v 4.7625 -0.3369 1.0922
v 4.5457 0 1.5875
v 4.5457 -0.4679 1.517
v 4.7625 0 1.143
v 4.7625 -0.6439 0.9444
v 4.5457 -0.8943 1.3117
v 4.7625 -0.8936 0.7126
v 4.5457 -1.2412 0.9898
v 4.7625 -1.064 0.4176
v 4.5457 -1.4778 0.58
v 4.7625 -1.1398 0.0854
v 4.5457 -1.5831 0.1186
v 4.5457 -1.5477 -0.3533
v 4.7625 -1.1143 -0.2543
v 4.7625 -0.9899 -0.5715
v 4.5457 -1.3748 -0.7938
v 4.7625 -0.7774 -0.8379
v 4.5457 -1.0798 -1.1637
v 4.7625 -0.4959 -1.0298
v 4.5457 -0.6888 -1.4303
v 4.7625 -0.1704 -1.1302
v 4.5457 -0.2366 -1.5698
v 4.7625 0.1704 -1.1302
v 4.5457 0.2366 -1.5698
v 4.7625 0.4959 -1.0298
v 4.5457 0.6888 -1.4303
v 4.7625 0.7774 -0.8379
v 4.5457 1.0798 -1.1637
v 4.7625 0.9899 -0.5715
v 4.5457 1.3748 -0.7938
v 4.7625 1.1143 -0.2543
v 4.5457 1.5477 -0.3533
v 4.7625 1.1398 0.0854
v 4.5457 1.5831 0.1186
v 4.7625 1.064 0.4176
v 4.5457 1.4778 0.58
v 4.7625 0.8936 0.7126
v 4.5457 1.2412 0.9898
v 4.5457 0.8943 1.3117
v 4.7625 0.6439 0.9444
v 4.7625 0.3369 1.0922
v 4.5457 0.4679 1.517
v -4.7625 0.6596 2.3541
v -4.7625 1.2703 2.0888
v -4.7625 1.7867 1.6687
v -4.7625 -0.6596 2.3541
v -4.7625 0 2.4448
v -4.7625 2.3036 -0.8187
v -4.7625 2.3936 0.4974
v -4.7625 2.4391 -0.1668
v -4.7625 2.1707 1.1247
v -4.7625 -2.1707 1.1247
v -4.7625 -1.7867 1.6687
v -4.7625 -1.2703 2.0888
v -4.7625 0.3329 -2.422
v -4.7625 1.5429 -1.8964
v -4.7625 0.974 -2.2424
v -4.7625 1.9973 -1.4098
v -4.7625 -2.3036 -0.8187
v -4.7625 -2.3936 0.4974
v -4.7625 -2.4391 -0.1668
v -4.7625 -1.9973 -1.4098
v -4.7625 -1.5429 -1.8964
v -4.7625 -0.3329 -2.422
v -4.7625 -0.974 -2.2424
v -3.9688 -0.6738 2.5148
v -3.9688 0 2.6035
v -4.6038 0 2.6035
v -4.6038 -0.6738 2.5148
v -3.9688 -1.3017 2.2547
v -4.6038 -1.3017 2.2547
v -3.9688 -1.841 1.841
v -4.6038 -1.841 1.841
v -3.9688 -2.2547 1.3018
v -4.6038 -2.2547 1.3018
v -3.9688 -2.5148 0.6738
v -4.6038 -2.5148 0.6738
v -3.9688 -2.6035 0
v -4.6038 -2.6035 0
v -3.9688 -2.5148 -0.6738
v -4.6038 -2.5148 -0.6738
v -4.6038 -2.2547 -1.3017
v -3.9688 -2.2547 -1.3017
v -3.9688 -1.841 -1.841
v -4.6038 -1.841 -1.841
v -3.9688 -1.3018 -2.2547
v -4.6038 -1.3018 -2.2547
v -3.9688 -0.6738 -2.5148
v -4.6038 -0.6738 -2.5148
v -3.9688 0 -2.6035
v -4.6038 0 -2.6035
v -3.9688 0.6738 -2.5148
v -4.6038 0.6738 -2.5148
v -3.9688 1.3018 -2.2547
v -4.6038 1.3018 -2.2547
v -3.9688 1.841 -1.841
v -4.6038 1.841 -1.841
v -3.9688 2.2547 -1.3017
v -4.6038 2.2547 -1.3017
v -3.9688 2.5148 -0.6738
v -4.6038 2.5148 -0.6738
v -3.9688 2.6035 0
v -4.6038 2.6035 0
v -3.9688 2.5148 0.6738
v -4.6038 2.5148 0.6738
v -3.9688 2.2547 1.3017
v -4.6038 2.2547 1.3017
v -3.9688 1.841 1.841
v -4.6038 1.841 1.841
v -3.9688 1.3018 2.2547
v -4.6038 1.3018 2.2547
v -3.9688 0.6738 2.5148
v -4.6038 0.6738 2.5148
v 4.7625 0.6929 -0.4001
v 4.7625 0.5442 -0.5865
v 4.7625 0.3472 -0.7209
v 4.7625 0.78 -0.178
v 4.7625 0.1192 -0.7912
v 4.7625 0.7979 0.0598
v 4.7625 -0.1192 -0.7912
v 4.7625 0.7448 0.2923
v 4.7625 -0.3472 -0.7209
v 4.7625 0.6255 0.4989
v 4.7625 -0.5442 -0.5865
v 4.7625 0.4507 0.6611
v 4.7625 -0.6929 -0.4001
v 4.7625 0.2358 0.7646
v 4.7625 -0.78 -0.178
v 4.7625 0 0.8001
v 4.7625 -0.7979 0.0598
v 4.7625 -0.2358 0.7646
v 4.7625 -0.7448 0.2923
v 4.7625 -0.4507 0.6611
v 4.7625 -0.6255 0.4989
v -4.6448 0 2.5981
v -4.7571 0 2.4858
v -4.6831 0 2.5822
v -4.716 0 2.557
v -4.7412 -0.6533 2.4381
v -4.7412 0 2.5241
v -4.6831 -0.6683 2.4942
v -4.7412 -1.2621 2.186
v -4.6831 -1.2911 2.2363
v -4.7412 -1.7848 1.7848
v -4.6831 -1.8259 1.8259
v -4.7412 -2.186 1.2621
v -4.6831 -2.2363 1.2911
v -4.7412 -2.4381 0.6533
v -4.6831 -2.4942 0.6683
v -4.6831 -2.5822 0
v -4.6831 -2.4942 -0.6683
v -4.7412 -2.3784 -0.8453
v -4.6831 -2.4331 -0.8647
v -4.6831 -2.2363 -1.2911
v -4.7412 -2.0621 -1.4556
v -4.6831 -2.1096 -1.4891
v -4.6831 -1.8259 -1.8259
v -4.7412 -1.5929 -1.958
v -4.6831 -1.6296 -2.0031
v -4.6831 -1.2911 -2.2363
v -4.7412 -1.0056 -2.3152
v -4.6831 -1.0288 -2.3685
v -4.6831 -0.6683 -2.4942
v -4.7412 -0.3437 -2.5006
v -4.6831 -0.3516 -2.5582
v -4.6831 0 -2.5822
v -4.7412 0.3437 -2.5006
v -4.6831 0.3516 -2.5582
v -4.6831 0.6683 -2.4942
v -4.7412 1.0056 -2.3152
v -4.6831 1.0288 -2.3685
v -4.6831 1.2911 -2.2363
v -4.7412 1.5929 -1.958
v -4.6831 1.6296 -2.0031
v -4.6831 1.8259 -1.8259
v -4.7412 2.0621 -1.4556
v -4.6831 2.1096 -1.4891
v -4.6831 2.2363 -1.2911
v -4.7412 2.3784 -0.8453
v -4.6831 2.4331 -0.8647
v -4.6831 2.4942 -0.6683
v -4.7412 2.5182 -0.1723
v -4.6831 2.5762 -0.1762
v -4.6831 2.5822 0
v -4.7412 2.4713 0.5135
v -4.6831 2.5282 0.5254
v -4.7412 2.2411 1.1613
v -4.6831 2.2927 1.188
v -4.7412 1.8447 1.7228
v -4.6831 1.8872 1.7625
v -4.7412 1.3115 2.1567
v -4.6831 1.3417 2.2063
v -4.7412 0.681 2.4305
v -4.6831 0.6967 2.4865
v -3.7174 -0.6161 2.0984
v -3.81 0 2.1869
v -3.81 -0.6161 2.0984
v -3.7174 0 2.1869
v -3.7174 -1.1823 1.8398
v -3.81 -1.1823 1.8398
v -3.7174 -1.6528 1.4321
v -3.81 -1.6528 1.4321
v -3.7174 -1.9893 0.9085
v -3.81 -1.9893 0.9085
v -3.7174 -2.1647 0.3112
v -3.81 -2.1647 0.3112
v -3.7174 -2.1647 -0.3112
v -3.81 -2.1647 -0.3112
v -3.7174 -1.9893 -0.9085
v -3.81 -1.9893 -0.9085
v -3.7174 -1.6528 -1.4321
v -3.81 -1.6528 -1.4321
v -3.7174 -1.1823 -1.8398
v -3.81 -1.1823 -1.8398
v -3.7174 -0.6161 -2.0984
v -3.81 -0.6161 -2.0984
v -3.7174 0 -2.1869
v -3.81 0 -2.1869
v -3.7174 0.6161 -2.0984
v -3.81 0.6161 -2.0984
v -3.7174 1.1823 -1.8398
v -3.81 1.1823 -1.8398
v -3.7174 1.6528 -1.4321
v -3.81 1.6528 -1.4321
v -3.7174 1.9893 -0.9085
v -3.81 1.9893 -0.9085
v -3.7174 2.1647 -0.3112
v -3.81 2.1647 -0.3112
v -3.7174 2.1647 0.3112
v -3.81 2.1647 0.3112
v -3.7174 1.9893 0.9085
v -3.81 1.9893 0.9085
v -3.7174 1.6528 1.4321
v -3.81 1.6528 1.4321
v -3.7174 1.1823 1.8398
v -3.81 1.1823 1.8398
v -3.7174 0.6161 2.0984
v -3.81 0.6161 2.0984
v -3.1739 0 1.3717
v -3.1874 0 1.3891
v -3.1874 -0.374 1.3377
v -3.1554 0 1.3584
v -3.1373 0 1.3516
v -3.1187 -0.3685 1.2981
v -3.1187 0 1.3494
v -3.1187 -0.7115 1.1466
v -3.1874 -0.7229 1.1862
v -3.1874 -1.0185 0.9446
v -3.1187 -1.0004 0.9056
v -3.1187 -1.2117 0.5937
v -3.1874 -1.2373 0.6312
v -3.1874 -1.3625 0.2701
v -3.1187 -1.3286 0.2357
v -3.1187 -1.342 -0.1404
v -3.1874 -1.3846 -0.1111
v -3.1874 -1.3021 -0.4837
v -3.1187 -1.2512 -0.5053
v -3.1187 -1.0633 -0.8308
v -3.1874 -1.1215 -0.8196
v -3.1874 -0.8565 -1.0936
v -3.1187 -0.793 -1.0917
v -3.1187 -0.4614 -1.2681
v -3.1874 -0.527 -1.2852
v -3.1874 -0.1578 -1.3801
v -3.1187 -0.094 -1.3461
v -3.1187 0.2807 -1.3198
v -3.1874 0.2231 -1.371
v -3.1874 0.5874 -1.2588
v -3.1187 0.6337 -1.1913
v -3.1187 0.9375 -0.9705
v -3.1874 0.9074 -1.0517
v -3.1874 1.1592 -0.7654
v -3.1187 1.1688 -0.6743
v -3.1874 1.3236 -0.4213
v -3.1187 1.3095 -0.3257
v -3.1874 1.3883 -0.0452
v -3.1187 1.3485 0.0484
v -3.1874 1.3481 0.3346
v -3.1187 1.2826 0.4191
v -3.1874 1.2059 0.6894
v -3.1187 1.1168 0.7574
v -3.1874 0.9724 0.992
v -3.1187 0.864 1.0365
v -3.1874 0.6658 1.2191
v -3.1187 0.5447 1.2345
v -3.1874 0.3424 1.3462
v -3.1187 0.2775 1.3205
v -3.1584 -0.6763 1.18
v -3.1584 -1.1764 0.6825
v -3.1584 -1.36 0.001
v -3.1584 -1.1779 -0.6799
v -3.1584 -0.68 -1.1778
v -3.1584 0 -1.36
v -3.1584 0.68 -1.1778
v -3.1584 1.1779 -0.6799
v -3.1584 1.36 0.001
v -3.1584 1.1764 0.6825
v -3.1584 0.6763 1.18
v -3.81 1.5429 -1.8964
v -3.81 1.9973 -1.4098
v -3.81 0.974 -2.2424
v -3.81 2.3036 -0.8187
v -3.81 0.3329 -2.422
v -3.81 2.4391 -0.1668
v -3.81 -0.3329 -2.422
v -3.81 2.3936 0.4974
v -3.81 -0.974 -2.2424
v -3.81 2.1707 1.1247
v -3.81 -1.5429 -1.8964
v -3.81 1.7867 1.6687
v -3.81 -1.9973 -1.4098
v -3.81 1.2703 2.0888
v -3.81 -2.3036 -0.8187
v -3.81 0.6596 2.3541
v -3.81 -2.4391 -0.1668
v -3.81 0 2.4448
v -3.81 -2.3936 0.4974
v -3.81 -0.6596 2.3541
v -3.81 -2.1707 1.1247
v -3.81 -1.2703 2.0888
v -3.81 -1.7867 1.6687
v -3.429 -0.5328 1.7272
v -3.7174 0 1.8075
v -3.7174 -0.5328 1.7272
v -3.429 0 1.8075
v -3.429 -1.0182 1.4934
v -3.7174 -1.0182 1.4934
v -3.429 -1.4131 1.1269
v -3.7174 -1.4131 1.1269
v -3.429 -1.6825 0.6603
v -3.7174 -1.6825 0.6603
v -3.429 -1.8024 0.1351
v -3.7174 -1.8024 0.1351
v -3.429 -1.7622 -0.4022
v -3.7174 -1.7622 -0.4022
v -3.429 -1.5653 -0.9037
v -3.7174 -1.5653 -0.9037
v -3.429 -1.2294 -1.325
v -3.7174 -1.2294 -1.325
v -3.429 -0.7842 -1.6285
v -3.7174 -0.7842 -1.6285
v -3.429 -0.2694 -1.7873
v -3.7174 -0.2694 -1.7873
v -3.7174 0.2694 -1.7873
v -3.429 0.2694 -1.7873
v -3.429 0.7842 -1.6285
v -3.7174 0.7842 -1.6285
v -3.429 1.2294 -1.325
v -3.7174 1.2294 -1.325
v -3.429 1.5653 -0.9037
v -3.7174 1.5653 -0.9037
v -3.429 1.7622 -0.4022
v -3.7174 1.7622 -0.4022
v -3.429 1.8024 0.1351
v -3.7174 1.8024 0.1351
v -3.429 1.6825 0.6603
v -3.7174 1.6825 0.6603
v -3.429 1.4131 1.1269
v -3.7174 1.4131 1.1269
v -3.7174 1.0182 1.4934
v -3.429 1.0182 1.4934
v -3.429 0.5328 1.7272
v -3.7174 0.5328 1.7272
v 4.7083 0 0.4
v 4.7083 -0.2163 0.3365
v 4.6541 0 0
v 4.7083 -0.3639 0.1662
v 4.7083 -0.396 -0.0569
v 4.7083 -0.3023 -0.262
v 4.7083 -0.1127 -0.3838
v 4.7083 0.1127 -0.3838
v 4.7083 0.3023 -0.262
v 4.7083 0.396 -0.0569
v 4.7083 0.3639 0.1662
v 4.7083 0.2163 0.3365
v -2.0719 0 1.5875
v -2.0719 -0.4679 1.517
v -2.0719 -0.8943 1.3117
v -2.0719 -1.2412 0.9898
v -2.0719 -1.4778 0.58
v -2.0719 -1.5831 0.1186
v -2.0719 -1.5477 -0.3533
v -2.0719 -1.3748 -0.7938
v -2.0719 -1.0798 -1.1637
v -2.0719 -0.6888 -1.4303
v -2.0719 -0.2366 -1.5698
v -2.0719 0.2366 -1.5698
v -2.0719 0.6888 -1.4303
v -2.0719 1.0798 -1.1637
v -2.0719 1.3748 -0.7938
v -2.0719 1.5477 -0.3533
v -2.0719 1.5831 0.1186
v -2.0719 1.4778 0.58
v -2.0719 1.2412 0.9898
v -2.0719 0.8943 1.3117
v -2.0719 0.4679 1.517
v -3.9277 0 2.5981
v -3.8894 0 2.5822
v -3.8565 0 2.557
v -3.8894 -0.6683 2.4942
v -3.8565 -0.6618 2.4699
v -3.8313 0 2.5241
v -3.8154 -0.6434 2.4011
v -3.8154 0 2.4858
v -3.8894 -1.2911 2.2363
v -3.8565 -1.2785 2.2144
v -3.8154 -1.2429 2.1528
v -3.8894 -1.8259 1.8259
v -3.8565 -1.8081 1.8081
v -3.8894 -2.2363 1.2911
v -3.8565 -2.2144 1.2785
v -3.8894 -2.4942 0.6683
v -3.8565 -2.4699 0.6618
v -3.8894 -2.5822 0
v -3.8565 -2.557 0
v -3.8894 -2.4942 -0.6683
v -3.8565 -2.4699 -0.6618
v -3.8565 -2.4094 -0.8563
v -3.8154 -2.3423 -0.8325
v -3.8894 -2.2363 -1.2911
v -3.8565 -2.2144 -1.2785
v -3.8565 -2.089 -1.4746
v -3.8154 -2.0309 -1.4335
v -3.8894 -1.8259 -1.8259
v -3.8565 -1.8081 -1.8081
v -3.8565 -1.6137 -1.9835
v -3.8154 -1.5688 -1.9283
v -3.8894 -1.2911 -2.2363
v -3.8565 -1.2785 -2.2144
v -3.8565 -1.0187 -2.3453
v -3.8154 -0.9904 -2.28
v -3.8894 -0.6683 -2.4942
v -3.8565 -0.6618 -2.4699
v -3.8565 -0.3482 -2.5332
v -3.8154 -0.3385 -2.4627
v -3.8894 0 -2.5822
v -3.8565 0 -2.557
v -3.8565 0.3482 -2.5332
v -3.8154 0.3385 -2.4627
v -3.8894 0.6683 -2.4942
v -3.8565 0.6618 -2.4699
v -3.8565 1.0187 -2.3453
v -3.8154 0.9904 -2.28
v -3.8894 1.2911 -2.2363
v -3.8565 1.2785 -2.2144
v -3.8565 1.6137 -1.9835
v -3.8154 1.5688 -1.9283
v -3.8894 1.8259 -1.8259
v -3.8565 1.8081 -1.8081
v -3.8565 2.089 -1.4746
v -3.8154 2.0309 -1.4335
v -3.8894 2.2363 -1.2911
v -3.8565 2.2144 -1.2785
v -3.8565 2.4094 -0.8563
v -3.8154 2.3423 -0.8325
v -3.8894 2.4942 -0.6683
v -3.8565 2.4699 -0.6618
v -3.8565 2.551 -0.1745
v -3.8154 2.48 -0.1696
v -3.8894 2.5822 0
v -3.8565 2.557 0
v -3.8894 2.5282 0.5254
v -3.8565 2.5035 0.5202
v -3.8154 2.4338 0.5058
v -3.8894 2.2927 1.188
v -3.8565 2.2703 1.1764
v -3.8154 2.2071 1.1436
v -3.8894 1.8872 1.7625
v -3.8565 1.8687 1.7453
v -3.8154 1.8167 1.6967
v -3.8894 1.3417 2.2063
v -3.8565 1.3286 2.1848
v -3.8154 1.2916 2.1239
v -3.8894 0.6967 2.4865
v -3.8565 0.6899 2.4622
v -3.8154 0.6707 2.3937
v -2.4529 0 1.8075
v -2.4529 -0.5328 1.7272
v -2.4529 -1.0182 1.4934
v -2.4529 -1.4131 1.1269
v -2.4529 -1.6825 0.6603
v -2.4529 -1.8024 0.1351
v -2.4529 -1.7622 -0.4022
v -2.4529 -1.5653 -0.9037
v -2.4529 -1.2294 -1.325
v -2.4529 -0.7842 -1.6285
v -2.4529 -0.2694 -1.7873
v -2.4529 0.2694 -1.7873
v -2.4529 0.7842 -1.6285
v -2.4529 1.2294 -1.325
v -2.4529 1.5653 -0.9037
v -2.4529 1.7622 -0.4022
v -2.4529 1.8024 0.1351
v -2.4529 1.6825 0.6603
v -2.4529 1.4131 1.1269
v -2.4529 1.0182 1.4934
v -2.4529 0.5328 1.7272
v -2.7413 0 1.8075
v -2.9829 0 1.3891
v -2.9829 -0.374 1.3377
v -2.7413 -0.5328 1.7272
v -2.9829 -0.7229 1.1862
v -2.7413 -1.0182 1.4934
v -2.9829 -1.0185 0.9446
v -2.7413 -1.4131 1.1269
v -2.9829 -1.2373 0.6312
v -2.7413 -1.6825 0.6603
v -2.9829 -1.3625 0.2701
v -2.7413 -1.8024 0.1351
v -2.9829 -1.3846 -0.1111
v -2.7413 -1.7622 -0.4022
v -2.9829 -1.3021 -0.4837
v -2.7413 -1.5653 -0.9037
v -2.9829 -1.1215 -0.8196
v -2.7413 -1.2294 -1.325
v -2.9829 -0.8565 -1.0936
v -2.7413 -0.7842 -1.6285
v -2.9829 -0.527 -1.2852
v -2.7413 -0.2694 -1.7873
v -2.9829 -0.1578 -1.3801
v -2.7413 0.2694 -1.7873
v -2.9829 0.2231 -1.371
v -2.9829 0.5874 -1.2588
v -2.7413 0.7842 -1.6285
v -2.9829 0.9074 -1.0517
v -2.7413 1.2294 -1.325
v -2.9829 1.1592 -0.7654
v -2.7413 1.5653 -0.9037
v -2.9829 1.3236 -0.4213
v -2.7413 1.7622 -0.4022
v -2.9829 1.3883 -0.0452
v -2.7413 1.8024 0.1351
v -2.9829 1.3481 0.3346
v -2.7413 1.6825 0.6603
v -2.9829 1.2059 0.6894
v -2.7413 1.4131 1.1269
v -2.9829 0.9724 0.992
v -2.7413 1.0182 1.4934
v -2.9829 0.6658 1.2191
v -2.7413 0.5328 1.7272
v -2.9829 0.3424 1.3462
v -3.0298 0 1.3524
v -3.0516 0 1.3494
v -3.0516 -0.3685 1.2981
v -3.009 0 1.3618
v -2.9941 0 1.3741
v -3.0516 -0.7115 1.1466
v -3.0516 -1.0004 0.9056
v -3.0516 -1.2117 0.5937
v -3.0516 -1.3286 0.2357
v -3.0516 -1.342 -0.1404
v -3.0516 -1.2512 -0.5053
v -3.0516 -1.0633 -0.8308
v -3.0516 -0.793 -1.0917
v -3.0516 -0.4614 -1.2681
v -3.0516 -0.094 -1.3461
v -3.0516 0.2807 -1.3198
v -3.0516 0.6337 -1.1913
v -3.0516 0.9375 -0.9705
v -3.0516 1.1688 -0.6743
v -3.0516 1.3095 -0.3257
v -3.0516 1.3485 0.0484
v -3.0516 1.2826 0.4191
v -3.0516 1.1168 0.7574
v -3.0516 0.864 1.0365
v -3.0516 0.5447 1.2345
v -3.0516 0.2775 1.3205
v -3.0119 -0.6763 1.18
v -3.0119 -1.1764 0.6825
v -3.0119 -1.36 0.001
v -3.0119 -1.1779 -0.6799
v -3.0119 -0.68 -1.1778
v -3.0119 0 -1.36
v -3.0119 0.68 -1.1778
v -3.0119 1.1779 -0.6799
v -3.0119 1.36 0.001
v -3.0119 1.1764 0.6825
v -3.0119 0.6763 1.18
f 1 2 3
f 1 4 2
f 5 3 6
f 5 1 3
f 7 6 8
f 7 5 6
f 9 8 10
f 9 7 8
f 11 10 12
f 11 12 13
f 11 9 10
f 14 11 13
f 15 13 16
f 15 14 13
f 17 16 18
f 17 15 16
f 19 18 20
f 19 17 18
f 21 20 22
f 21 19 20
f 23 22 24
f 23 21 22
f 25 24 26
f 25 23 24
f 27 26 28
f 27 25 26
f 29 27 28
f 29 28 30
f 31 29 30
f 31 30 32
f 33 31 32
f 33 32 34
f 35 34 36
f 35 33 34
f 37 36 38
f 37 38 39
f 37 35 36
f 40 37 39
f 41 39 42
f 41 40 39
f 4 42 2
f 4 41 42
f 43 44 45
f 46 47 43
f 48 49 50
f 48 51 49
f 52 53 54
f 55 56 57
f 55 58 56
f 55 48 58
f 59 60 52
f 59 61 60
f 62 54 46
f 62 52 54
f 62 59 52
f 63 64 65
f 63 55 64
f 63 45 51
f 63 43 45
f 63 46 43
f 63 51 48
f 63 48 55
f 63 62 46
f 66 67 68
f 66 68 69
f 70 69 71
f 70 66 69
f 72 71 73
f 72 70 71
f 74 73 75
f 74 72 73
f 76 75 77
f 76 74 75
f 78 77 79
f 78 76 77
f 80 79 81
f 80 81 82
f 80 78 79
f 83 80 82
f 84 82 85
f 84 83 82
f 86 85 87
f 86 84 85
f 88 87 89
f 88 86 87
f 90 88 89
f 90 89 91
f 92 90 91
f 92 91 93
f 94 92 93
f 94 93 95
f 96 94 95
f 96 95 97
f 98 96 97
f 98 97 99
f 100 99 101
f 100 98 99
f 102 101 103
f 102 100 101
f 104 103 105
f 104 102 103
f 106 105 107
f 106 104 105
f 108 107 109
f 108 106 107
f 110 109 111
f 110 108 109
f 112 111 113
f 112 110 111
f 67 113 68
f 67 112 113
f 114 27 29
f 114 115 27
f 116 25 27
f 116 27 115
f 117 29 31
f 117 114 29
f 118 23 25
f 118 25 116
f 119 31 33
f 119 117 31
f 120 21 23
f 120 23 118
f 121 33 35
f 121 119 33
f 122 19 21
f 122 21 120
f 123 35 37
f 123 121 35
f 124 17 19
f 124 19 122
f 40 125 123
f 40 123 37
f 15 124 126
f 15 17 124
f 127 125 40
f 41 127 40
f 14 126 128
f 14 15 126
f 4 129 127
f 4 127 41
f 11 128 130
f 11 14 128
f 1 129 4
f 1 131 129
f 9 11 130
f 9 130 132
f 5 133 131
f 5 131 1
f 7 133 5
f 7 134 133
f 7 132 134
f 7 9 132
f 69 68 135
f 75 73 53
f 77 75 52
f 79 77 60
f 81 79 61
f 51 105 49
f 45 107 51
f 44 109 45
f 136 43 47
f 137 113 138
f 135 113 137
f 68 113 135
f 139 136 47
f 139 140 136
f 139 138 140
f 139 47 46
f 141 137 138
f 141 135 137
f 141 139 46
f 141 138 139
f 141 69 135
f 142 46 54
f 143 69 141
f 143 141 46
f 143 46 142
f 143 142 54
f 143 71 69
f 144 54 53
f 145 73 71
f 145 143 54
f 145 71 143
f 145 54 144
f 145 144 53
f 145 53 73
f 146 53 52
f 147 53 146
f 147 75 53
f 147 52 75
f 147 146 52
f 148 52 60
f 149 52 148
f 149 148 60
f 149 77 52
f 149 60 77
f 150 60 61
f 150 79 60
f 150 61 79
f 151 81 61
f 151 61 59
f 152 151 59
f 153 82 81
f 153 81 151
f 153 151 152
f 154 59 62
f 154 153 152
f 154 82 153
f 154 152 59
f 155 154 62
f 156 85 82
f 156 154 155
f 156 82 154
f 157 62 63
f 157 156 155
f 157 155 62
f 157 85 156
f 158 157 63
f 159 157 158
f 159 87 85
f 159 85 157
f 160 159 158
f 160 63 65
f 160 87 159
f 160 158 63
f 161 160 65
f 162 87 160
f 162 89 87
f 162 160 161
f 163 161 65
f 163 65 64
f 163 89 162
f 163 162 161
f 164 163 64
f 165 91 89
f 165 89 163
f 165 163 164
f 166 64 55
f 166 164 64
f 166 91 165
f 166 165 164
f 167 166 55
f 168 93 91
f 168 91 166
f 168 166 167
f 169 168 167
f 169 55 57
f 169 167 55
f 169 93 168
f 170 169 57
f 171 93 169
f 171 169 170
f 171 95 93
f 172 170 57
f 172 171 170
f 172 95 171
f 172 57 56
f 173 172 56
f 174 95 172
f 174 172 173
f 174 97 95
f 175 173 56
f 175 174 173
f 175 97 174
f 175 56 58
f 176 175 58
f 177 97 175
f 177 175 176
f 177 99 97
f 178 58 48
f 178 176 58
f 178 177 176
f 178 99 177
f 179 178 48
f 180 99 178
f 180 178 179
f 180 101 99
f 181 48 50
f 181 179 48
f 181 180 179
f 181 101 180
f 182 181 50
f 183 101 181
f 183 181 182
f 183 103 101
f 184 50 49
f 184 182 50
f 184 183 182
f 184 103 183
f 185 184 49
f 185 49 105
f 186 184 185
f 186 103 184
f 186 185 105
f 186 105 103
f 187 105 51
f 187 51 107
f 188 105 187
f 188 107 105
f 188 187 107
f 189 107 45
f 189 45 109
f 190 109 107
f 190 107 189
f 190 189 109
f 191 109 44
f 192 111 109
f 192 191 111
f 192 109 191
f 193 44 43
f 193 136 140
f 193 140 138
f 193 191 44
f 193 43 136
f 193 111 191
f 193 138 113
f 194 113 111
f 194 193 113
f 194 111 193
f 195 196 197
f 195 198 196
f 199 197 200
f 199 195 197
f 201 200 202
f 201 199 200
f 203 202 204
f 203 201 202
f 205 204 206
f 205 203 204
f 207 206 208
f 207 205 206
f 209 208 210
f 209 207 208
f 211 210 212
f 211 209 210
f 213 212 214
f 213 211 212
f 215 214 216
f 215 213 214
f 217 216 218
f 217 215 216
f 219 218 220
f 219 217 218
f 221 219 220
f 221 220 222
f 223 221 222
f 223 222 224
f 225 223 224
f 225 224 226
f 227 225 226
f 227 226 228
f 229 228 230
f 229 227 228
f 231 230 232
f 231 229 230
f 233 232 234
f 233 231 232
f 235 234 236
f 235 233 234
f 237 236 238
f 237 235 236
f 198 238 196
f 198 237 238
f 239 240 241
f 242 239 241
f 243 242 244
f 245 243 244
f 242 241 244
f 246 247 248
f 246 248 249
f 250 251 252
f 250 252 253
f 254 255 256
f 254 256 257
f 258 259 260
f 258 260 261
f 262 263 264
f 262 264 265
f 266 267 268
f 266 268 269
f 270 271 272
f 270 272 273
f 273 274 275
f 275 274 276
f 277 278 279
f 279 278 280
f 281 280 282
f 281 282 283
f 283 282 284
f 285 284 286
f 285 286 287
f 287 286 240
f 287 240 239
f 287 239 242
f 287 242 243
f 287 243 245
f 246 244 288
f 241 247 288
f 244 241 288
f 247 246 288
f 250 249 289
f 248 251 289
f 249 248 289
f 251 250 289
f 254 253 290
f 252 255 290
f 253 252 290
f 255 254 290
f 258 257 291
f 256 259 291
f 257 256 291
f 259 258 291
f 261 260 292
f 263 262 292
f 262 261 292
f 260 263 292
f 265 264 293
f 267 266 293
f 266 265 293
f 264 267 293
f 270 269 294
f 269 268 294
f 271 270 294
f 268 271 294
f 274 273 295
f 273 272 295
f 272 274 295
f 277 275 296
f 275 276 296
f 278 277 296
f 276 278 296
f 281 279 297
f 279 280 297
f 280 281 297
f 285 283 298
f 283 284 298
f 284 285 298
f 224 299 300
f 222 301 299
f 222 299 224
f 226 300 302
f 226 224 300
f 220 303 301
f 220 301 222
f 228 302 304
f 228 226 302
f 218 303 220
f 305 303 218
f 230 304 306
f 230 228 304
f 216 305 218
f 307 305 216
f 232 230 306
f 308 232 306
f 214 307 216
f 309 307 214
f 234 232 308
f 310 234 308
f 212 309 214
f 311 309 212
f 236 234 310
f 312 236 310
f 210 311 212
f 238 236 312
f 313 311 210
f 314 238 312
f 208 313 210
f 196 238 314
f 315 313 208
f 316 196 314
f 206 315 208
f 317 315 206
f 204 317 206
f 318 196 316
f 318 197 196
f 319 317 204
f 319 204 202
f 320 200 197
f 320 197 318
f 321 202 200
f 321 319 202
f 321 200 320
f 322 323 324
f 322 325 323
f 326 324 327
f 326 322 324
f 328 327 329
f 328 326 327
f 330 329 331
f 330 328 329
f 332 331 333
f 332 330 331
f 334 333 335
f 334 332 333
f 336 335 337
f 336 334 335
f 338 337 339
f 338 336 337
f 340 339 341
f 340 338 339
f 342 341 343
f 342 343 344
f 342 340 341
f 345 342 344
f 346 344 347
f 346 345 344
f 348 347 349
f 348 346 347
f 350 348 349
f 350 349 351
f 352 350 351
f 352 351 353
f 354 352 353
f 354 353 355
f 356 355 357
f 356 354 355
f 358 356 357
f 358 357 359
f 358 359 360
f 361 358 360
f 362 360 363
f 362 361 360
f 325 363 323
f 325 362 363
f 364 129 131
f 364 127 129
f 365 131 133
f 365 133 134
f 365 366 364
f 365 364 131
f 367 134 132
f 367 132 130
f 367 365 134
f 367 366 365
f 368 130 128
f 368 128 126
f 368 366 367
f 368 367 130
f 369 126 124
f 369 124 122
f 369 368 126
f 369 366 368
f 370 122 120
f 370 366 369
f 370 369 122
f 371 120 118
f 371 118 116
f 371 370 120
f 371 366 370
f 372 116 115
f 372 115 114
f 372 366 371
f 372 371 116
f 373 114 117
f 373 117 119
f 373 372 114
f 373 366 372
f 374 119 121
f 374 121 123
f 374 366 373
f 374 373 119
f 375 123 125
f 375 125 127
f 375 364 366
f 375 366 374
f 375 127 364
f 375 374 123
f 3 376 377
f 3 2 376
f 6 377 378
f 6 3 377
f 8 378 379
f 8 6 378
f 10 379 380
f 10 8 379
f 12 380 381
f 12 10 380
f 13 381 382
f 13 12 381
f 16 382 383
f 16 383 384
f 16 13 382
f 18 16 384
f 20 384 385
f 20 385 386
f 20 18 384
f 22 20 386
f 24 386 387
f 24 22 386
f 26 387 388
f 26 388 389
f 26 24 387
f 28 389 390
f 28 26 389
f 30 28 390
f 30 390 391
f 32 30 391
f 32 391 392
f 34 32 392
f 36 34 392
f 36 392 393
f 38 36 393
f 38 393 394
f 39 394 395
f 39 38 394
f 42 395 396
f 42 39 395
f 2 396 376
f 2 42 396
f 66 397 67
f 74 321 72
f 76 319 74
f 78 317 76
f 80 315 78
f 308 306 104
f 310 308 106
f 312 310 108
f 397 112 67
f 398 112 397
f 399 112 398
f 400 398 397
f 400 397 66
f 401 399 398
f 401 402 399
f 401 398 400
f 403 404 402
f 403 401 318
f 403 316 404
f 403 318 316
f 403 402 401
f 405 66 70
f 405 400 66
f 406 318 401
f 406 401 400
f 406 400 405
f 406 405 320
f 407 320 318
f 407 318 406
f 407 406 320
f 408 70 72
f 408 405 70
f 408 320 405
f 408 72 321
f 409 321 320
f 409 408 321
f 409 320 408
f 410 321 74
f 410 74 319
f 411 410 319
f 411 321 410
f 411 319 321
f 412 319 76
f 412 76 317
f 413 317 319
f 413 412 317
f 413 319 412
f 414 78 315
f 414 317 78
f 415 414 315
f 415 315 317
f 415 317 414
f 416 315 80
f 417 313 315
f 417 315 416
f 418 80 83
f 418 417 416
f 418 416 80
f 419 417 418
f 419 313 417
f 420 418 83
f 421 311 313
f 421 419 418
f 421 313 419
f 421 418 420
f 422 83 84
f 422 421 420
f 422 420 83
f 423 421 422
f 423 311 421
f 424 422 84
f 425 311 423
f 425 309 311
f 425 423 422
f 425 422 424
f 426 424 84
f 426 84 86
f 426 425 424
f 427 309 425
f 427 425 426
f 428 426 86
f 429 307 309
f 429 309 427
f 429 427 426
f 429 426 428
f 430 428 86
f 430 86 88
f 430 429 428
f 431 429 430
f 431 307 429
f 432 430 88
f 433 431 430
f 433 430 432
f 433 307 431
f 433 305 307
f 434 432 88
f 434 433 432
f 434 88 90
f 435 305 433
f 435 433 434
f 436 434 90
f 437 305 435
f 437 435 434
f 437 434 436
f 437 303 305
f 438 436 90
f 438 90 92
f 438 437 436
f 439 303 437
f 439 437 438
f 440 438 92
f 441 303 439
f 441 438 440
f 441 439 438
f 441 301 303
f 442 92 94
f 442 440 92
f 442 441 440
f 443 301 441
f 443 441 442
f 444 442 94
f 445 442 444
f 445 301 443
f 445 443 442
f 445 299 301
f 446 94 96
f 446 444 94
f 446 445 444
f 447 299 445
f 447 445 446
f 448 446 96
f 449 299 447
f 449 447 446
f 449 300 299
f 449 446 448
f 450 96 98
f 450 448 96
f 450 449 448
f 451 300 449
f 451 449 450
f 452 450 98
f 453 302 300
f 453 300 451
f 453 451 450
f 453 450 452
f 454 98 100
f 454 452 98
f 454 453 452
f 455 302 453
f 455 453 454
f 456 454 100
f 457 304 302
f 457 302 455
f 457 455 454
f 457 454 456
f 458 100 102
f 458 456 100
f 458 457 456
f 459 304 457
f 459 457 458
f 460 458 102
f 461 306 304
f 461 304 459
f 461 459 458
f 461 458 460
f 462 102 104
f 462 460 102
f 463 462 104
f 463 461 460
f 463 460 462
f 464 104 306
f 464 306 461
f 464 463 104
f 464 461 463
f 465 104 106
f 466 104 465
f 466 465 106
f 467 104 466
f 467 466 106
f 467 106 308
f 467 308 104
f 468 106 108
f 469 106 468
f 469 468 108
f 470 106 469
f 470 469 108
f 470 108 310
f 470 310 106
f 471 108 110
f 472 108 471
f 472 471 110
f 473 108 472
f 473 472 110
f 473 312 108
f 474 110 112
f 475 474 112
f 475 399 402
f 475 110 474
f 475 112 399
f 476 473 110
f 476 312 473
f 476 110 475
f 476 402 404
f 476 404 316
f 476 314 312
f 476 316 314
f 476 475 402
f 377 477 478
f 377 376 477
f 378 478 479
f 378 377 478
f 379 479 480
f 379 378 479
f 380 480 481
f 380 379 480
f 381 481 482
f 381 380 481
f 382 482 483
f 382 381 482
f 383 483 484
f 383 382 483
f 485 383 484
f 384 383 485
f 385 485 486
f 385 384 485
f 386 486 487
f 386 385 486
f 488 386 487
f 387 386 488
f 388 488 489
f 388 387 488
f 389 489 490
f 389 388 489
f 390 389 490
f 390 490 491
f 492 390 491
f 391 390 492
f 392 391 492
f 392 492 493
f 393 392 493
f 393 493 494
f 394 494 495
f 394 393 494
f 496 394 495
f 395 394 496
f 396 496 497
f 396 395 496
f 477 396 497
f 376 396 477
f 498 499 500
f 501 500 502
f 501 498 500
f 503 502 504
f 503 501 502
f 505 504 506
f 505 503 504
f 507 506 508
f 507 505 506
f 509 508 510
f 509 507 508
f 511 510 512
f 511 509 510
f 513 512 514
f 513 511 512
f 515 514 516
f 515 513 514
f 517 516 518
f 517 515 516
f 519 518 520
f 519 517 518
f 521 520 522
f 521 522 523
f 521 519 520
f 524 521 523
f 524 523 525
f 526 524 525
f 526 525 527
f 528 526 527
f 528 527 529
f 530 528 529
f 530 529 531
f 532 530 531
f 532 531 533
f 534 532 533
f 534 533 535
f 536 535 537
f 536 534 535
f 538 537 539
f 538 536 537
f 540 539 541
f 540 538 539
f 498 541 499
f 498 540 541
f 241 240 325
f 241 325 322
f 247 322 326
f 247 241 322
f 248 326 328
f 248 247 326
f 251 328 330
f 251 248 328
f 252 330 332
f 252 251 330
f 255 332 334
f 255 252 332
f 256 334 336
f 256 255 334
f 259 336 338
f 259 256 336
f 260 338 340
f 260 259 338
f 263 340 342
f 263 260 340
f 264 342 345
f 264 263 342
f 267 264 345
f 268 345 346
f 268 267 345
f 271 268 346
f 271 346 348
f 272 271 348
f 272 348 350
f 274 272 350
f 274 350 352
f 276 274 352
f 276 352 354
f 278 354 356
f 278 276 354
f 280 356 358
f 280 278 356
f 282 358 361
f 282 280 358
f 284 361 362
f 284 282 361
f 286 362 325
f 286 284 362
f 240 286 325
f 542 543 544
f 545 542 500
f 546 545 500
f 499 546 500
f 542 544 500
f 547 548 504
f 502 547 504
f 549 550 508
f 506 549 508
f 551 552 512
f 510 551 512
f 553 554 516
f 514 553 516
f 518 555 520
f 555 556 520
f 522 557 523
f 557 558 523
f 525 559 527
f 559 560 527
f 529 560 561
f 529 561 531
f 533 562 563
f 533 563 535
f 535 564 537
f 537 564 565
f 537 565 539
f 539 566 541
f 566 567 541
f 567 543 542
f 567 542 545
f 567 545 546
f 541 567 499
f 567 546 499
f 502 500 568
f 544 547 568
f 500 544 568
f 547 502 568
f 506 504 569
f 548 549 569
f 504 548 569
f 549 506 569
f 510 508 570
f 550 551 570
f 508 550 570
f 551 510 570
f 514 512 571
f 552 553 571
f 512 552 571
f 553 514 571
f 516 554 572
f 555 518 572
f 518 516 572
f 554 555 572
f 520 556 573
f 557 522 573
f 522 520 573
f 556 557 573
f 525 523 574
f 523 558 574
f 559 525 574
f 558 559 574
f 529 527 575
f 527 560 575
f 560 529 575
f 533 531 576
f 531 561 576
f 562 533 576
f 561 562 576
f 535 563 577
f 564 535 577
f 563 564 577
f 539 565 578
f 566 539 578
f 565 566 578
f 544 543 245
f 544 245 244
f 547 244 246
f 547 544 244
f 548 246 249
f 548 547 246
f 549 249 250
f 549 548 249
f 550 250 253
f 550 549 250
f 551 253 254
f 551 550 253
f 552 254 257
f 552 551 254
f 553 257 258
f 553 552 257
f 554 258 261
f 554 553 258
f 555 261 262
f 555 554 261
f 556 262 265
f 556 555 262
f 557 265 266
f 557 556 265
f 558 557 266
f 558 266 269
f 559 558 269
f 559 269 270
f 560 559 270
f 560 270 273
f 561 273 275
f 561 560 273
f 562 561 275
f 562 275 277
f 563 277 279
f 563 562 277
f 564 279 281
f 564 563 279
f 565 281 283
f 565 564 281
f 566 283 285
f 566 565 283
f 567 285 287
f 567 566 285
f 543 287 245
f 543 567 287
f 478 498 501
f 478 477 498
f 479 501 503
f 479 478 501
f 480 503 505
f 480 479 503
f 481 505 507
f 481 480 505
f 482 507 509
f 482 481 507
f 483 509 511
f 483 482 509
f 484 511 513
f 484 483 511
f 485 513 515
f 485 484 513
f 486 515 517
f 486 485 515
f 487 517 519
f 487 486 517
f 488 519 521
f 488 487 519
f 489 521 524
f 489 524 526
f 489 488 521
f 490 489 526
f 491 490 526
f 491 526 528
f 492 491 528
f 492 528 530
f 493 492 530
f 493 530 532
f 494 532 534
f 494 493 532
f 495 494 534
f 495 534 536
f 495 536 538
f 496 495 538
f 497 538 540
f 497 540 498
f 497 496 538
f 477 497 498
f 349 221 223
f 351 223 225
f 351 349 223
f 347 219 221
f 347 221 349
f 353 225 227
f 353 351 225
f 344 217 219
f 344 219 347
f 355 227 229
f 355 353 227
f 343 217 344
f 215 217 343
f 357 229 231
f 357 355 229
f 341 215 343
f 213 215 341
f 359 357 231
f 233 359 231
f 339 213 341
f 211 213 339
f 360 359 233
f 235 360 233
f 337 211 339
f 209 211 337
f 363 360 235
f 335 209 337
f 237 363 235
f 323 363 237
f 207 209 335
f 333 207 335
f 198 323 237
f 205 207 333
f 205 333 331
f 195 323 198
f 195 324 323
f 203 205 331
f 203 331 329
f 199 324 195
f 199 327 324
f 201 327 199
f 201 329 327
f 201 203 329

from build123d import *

# Parameters (mm, degrees)
FILLET1_R = 0.15875
FILLET2_R = 0.079375


with BuildPart() as part:
    # Sketch1 → Revolve1 (revolve)
    with BuildSketch(Plane.XY):
        Polygon((-4.7625, 0), (-4.7625, 2.6035), (-3.81, 2.6035), (-3.81, 2.18694), (-3.717429994, 2.18694), (-3.717429994, 1.807470453), (-3.429, 1.807470453), (-3.164518467, 1.349375), (-3.005768467, 1.349375), (-2.741286934, 1.807470453), (-2.45285694, 1.807470453), (-2.07185694, 1.5875), (4.545702864, 1.5875), (4.7625, 1.143), (4.7625, 0.8001), (4.654101432, 0), align=None)
    revolve(axis=Axis((-4.7625, 0, 0), (1, 0, 0)))

    # Fillet1
    fillet1_edges = [part.edges().sort_by_distance(p)[0] for p in [
        (-3.81, -2.6035, 0),
        (-4.7625, -2.6035, 0),
    ]]
    fillet(fillet1_edges, radius=FILLET1_R)

    # Fillet2
    fillet2_edges = [part.edges().sort_by_distance(p)[0] for p in [
        (-3.164518467, -1.349375, 0),
        (-3.005768467, -1.349375, 0),
    ]]
    fillet(fillet2_edges, radius=FILLET2_R)


solid = part.part
